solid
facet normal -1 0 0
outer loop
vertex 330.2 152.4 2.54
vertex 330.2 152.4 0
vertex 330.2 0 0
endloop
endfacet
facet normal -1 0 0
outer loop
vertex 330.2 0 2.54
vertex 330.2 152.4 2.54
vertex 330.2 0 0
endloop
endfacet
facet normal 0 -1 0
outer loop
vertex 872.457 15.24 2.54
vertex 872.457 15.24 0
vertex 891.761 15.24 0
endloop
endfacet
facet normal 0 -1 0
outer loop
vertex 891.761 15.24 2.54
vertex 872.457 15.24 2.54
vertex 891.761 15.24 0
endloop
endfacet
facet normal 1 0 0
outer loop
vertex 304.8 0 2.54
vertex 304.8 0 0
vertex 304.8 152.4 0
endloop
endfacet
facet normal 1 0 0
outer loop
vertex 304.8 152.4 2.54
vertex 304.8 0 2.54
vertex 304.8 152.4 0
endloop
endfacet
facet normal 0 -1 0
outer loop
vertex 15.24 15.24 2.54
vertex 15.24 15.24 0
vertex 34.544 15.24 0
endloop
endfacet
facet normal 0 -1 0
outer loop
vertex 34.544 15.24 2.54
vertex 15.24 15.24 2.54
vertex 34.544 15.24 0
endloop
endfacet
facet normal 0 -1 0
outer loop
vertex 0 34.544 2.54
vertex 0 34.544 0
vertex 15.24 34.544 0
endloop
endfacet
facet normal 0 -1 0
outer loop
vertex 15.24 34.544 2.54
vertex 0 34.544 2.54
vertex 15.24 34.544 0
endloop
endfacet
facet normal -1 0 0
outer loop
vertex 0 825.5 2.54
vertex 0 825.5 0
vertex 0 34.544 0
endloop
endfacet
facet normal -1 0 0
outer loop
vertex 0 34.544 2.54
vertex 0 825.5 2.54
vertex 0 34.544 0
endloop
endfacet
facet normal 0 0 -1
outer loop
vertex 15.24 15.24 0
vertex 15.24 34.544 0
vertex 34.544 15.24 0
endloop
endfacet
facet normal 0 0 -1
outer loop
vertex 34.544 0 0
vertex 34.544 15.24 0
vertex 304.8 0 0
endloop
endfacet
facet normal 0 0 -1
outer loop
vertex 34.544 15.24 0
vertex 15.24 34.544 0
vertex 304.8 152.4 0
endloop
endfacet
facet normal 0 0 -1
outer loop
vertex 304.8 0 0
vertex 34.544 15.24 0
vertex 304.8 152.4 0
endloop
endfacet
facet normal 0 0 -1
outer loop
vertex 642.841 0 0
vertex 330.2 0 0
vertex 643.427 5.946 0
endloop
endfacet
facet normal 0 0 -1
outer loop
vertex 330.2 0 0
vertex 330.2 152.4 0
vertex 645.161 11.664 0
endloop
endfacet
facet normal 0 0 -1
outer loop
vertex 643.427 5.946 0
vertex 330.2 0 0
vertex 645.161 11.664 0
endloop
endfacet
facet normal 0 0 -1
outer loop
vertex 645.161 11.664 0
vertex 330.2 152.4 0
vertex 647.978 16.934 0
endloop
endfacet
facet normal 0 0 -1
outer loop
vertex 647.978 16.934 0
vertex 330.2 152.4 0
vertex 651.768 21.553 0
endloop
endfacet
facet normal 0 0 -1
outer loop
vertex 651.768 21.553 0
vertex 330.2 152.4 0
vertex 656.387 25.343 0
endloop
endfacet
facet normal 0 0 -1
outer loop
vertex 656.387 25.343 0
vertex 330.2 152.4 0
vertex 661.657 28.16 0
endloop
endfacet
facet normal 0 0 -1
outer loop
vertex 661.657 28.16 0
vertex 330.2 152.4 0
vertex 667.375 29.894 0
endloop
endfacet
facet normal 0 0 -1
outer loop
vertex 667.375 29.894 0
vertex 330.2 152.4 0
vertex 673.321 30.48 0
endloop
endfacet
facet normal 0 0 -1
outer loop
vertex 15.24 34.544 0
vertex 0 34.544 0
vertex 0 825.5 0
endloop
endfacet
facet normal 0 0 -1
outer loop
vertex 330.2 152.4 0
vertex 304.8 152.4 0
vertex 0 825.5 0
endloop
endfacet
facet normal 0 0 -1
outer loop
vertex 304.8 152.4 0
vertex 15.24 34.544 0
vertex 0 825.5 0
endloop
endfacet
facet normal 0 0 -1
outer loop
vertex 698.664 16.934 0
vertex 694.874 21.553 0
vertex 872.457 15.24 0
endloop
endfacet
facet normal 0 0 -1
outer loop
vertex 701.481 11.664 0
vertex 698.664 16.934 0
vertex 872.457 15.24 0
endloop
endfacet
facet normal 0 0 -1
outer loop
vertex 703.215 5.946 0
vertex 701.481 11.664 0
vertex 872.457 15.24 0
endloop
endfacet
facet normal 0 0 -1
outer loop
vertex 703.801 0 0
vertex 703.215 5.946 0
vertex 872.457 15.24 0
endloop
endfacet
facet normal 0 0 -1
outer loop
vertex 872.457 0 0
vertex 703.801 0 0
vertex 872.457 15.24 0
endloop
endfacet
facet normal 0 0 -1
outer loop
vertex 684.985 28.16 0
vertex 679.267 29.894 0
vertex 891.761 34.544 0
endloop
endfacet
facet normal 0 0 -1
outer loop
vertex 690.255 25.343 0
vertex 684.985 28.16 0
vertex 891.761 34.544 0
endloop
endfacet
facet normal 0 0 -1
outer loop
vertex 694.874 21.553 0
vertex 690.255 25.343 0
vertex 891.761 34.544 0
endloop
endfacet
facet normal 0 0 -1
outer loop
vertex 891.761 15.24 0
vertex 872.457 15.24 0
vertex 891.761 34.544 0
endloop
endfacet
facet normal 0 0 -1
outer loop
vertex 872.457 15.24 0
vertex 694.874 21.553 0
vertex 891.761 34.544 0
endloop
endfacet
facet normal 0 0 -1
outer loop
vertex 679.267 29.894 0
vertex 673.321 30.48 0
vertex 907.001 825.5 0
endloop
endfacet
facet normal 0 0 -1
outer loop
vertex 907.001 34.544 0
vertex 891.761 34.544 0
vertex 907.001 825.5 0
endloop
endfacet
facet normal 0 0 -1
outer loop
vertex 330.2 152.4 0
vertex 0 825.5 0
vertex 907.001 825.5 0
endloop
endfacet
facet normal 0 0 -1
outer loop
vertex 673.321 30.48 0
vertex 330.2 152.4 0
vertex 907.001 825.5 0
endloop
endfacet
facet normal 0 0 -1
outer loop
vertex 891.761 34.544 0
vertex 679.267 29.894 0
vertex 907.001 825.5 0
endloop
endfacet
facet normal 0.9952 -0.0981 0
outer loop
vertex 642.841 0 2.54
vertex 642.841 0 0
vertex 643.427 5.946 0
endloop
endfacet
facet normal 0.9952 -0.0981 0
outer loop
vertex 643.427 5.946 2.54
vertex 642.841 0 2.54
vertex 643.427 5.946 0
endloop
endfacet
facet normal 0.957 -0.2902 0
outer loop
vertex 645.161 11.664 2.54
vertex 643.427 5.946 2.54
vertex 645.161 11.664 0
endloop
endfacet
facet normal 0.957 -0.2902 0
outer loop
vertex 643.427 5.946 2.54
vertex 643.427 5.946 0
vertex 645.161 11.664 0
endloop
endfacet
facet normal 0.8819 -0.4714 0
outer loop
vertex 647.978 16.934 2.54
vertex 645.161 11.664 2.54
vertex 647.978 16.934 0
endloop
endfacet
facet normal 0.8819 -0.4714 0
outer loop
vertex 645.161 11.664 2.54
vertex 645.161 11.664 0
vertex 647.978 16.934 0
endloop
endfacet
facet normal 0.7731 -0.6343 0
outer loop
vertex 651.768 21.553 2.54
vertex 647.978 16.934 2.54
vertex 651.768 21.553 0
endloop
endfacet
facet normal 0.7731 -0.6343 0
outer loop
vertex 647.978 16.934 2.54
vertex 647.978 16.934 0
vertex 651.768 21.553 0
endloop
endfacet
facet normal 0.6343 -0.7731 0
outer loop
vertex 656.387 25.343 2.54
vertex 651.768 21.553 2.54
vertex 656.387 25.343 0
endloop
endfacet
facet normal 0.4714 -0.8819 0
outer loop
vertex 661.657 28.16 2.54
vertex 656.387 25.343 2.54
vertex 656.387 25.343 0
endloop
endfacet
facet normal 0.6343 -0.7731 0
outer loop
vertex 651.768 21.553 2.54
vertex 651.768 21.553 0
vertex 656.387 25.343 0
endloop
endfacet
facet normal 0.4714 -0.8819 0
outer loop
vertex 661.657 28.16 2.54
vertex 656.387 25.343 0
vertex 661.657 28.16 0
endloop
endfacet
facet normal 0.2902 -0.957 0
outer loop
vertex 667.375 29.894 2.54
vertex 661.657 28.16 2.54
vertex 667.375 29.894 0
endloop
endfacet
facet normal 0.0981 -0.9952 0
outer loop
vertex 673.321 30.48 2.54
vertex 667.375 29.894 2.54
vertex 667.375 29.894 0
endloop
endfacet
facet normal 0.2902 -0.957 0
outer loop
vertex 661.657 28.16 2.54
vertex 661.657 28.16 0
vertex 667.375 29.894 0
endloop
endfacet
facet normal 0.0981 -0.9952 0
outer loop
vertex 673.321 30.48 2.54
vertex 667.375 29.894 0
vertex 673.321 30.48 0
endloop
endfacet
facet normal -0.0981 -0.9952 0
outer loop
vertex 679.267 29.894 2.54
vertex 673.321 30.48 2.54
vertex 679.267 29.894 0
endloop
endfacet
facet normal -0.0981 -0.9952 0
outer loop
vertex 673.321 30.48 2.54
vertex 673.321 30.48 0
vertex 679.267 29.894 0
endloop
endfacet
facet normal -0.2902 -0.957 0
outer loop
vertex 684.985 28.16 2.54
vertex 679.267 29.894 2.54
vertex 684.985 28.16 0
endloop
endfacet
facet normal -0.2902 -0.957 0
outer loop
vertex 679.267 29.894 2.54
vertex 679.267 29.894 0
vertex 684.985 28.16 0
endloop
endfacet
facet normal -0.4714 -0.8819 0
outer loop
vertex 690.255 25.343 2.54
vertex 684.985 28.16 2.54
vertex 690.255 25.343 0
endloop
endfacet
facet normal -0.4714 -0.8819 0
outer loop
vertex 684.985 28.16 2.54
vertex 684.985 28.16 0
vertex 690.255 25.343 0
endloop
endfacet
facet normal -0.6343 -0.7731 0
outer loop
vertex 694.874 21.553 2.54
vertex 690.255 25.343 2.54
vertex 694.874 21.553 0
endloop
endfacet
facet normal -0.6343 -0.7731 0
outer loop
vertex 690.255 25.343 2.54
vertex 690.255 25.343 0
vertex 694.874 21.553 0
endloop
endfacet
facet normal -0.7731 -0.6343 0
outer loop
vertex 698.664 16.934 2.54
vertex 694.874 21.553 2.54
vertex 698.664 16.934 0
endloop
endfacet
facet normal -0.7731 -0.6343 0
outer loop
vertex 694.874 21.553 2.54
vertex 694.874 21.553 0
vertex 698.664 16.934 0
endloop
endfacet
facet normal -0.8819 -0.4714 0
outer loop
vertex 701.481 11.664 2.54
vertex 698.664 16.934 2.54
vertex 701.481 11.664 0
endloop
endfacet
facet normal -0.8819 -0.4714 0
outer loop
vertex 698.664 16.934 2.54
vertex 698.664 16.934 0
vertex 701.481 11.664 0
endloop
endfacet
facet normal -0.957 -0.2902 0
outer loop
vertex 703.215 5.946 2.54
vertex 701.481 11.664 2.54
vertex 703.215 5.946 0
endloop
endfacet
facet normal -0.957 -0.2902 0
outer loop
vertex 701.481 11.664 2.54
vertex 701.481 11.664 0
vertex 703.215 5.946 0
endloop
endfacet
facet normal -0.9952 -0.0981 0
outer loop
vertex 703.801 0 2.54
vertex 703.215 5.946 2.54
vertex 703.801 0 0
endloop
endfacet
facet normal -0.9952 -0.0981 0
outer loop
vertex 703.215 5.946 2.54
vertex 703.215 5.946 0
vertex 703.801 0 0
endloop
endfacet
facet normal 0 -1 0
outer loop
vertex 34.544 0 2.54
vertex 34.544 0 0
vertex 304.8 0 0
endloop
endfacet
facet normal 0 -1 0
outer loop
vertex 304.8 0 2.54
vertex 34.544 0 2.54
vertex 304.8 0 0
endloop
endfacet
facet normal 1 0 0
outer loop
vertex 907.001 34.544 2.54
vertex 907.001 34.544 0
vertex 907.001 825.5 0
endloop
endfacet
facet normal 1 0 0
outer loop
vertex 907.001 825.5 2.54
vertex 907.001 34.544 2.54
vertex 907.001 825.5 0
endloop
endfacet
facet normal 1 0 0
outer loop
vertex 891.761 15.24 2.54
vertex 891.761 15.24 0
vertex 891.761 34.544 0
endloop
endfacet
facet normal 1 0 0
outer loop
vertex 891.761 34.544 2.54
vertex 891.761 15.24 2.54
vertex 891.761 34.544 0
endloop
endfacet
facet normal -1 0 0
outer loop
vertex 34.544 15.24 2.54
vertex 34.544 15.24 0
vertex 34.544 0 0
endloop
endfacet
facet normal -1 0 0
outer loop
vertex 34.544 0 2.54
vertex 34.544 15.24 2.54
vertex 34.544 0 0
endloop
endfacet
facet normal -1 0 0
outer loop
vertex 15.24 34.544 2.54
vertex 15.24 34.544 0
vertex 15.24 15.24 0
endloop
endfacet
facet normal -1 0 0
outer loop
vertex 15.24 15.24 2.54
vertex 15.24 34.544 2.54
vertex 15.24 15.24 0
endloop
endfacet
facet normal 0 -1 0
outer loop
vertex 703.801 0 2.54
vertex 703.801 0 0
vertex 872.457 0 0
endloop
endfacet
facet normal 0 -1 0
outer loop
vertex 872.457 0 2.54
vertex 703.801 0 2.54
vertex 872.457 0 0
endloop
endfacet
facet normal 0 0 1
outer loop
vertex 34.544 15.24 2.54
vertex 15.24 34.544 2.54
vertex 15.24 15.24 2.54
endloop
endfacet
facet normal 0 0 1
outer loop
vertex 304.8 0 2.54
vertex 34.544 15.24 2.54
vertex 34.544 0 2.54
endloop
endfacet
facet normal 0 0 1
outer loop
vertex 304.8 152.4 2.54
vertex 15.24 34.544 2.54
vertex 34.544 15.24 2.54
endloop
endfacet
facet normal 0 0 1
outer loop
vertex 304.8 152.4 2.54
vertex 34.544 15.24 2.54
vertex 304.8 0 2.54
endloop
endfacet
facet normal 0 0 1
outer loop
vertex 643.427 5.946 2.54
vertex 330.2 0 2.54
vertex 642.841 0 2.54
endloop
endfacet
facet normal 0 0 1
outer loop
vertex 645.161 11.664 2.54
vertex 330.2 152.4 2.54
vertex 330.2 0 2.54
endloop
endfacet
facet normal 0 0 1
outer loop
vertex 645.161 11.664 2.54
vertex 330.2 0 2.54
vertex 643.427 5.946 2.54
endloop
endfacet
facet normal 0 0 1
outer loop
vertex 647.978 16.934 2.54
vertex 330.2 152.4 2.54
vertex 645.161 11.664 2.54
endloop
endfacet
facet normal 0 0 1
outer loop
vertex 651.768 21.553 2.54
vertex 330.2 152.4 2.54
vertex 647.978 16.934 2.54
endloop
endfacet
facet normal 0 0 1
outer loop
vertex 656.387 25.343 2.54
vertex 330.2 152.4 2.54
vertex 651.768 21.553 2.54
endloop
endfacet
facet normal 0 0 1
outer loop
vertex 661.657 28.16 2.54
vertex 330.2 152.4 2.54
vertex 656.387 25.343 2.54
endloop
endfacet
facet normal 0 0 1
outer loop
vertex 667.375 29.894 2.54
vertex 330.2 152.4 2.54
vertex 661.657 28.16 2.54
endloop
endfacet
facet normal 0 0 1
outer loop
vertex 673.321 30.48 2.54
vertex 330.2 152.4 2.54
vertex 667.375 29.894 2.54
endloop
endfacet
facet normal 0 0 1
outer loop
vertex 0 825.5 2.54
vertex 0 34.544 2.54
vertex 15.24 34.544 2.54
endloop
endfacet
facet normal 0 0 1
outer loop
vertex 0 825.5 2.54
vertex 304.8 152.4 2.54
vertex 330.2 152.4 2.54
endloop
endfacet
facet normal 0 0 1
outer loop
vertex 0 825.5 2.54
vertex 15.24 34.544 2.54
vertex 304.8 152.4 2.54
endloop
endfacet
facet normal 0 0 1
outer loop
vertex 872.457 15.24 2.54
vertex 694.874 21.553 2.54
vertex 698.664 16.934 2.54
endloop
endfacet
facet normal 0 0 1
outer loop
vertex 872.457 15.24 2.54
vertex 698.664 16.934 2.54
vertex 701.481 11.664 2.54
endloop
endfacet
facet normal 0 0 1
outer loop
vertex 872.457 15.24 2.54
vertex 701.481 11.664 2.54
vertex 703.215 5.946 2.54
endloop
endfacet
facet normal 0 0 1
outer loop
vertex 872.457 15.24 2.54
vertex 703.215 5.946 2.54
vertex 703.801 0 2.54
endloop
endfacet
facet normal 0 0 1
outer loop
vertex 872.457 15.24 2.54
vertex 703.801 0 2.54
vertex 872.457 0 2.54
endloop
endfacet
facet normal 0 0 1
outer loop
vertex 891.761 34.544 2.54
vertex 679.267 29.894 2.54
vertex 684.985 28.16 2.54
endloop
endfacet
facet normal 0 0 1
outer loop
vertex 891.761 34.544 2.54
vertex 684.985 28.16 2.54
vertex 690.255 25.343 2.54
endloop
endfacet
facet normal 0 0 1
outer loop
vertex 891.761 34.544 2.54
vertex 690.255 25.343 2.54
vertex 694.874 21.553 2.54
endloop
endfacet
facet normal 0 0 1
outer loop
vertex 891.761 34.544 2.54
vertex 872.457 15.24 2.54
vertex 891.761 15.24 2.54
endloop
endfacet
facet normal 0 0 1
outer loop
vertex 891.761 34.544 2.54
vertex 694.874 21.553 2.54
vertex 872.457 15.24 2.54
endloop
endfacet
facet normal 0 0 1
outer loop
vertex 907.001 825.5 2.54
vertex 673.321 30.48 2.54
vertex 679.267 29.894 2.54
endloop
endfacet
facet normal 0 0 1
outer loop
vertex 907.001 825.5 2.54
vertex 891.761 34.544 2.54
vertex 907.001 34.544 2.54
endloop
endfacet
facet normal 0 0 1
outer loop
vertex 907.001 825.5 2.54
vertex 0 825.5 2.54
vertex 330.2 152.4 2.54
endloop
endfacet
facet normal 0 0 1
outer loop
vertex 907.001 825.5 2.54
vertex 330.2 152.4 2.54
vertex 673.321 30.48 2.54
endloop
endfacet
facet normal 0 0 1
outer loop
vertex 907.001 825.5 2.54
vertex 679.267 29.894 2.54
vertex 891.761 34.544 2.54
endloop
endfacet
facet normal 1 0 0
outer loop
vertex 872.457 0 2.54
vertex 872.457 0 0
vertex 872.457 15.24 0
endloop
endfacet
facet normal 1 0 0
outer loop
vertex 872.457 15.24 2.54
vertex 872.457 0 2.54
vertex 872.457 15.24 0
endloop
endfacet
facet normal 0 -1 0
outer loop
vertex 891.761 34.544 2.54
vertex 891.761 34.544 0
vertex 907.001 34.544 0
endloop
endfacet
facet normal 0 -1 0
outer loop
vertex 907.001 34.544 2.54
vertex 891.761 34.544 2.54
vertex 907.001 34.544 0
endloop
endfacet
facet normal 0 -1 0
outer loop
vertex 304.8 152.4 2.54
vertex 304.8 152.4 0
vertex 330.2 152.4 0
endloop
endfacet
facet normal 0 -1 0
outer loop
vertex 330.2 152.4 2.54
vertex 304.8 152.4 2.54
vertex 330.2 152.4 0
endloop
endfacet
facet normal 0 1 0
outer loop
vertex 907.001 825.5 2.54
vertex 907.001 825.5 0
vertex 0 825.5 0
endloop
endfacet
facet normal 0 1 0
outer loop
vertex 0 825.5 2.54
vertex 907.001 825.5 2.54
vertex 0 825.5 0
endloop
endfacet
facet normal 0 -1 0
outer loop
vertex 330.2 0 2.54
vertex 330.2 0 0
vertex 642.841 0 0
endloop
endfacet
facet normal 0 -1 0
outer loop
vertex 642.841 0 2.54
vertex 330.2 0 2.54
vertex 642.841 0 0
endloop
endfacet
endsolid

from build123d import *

# Parameters (mm, degrees)
BOSS_EXTRUDE1_DEPTH = 2.54


with BuildPart() as part:
    # Sketch1 → Boss-Extrude1 (new body)
    with BuildSketch(Plane.XY):
        with BuildLine():
            Line((0, 825.5), (0, 34.544))
            Line((0, 34.544), (15.24, 34.544))
            Line((15.24, 34.544), (15.24, 15.24))
            Line((15.24, 15.24), (34.544, 15.24))
            Line((34.544, 15.24), (34.544, 0))
            Line((34.544, 0), (304.8, 0))
            Line((304.8, 0), (304.8, 152.4))
            Line((304.8, 152.4), (330.2, 152.4))
            Line((330.2, 152.4), (330.2, 0))
            Line((330.2, 0), (642.84098, 0))
            ThreePointArc((642.84098, 0), (673.32098, 30.48), (703.80098, 0))
            Line((703.80098, 0), (872.45698, 0))
            Line((872.45698, 0), (872.45698, 15.24))
            Line((872.45698, 15.24), (891.76098, 15.24))
            Line((891.76098, 15.24), (891.76098, 34.544))
            Line((891.76098, 34.544), (907.00098, 34.544))
            Line((907.00098, 34.544), (907.00098, 825.5))
            Line((907.00098, 825.5), (0, 825.5))
        make_face()
    extrude(amount=BOSS_EXTRUDE1_DEPTH)


solid = part.part
